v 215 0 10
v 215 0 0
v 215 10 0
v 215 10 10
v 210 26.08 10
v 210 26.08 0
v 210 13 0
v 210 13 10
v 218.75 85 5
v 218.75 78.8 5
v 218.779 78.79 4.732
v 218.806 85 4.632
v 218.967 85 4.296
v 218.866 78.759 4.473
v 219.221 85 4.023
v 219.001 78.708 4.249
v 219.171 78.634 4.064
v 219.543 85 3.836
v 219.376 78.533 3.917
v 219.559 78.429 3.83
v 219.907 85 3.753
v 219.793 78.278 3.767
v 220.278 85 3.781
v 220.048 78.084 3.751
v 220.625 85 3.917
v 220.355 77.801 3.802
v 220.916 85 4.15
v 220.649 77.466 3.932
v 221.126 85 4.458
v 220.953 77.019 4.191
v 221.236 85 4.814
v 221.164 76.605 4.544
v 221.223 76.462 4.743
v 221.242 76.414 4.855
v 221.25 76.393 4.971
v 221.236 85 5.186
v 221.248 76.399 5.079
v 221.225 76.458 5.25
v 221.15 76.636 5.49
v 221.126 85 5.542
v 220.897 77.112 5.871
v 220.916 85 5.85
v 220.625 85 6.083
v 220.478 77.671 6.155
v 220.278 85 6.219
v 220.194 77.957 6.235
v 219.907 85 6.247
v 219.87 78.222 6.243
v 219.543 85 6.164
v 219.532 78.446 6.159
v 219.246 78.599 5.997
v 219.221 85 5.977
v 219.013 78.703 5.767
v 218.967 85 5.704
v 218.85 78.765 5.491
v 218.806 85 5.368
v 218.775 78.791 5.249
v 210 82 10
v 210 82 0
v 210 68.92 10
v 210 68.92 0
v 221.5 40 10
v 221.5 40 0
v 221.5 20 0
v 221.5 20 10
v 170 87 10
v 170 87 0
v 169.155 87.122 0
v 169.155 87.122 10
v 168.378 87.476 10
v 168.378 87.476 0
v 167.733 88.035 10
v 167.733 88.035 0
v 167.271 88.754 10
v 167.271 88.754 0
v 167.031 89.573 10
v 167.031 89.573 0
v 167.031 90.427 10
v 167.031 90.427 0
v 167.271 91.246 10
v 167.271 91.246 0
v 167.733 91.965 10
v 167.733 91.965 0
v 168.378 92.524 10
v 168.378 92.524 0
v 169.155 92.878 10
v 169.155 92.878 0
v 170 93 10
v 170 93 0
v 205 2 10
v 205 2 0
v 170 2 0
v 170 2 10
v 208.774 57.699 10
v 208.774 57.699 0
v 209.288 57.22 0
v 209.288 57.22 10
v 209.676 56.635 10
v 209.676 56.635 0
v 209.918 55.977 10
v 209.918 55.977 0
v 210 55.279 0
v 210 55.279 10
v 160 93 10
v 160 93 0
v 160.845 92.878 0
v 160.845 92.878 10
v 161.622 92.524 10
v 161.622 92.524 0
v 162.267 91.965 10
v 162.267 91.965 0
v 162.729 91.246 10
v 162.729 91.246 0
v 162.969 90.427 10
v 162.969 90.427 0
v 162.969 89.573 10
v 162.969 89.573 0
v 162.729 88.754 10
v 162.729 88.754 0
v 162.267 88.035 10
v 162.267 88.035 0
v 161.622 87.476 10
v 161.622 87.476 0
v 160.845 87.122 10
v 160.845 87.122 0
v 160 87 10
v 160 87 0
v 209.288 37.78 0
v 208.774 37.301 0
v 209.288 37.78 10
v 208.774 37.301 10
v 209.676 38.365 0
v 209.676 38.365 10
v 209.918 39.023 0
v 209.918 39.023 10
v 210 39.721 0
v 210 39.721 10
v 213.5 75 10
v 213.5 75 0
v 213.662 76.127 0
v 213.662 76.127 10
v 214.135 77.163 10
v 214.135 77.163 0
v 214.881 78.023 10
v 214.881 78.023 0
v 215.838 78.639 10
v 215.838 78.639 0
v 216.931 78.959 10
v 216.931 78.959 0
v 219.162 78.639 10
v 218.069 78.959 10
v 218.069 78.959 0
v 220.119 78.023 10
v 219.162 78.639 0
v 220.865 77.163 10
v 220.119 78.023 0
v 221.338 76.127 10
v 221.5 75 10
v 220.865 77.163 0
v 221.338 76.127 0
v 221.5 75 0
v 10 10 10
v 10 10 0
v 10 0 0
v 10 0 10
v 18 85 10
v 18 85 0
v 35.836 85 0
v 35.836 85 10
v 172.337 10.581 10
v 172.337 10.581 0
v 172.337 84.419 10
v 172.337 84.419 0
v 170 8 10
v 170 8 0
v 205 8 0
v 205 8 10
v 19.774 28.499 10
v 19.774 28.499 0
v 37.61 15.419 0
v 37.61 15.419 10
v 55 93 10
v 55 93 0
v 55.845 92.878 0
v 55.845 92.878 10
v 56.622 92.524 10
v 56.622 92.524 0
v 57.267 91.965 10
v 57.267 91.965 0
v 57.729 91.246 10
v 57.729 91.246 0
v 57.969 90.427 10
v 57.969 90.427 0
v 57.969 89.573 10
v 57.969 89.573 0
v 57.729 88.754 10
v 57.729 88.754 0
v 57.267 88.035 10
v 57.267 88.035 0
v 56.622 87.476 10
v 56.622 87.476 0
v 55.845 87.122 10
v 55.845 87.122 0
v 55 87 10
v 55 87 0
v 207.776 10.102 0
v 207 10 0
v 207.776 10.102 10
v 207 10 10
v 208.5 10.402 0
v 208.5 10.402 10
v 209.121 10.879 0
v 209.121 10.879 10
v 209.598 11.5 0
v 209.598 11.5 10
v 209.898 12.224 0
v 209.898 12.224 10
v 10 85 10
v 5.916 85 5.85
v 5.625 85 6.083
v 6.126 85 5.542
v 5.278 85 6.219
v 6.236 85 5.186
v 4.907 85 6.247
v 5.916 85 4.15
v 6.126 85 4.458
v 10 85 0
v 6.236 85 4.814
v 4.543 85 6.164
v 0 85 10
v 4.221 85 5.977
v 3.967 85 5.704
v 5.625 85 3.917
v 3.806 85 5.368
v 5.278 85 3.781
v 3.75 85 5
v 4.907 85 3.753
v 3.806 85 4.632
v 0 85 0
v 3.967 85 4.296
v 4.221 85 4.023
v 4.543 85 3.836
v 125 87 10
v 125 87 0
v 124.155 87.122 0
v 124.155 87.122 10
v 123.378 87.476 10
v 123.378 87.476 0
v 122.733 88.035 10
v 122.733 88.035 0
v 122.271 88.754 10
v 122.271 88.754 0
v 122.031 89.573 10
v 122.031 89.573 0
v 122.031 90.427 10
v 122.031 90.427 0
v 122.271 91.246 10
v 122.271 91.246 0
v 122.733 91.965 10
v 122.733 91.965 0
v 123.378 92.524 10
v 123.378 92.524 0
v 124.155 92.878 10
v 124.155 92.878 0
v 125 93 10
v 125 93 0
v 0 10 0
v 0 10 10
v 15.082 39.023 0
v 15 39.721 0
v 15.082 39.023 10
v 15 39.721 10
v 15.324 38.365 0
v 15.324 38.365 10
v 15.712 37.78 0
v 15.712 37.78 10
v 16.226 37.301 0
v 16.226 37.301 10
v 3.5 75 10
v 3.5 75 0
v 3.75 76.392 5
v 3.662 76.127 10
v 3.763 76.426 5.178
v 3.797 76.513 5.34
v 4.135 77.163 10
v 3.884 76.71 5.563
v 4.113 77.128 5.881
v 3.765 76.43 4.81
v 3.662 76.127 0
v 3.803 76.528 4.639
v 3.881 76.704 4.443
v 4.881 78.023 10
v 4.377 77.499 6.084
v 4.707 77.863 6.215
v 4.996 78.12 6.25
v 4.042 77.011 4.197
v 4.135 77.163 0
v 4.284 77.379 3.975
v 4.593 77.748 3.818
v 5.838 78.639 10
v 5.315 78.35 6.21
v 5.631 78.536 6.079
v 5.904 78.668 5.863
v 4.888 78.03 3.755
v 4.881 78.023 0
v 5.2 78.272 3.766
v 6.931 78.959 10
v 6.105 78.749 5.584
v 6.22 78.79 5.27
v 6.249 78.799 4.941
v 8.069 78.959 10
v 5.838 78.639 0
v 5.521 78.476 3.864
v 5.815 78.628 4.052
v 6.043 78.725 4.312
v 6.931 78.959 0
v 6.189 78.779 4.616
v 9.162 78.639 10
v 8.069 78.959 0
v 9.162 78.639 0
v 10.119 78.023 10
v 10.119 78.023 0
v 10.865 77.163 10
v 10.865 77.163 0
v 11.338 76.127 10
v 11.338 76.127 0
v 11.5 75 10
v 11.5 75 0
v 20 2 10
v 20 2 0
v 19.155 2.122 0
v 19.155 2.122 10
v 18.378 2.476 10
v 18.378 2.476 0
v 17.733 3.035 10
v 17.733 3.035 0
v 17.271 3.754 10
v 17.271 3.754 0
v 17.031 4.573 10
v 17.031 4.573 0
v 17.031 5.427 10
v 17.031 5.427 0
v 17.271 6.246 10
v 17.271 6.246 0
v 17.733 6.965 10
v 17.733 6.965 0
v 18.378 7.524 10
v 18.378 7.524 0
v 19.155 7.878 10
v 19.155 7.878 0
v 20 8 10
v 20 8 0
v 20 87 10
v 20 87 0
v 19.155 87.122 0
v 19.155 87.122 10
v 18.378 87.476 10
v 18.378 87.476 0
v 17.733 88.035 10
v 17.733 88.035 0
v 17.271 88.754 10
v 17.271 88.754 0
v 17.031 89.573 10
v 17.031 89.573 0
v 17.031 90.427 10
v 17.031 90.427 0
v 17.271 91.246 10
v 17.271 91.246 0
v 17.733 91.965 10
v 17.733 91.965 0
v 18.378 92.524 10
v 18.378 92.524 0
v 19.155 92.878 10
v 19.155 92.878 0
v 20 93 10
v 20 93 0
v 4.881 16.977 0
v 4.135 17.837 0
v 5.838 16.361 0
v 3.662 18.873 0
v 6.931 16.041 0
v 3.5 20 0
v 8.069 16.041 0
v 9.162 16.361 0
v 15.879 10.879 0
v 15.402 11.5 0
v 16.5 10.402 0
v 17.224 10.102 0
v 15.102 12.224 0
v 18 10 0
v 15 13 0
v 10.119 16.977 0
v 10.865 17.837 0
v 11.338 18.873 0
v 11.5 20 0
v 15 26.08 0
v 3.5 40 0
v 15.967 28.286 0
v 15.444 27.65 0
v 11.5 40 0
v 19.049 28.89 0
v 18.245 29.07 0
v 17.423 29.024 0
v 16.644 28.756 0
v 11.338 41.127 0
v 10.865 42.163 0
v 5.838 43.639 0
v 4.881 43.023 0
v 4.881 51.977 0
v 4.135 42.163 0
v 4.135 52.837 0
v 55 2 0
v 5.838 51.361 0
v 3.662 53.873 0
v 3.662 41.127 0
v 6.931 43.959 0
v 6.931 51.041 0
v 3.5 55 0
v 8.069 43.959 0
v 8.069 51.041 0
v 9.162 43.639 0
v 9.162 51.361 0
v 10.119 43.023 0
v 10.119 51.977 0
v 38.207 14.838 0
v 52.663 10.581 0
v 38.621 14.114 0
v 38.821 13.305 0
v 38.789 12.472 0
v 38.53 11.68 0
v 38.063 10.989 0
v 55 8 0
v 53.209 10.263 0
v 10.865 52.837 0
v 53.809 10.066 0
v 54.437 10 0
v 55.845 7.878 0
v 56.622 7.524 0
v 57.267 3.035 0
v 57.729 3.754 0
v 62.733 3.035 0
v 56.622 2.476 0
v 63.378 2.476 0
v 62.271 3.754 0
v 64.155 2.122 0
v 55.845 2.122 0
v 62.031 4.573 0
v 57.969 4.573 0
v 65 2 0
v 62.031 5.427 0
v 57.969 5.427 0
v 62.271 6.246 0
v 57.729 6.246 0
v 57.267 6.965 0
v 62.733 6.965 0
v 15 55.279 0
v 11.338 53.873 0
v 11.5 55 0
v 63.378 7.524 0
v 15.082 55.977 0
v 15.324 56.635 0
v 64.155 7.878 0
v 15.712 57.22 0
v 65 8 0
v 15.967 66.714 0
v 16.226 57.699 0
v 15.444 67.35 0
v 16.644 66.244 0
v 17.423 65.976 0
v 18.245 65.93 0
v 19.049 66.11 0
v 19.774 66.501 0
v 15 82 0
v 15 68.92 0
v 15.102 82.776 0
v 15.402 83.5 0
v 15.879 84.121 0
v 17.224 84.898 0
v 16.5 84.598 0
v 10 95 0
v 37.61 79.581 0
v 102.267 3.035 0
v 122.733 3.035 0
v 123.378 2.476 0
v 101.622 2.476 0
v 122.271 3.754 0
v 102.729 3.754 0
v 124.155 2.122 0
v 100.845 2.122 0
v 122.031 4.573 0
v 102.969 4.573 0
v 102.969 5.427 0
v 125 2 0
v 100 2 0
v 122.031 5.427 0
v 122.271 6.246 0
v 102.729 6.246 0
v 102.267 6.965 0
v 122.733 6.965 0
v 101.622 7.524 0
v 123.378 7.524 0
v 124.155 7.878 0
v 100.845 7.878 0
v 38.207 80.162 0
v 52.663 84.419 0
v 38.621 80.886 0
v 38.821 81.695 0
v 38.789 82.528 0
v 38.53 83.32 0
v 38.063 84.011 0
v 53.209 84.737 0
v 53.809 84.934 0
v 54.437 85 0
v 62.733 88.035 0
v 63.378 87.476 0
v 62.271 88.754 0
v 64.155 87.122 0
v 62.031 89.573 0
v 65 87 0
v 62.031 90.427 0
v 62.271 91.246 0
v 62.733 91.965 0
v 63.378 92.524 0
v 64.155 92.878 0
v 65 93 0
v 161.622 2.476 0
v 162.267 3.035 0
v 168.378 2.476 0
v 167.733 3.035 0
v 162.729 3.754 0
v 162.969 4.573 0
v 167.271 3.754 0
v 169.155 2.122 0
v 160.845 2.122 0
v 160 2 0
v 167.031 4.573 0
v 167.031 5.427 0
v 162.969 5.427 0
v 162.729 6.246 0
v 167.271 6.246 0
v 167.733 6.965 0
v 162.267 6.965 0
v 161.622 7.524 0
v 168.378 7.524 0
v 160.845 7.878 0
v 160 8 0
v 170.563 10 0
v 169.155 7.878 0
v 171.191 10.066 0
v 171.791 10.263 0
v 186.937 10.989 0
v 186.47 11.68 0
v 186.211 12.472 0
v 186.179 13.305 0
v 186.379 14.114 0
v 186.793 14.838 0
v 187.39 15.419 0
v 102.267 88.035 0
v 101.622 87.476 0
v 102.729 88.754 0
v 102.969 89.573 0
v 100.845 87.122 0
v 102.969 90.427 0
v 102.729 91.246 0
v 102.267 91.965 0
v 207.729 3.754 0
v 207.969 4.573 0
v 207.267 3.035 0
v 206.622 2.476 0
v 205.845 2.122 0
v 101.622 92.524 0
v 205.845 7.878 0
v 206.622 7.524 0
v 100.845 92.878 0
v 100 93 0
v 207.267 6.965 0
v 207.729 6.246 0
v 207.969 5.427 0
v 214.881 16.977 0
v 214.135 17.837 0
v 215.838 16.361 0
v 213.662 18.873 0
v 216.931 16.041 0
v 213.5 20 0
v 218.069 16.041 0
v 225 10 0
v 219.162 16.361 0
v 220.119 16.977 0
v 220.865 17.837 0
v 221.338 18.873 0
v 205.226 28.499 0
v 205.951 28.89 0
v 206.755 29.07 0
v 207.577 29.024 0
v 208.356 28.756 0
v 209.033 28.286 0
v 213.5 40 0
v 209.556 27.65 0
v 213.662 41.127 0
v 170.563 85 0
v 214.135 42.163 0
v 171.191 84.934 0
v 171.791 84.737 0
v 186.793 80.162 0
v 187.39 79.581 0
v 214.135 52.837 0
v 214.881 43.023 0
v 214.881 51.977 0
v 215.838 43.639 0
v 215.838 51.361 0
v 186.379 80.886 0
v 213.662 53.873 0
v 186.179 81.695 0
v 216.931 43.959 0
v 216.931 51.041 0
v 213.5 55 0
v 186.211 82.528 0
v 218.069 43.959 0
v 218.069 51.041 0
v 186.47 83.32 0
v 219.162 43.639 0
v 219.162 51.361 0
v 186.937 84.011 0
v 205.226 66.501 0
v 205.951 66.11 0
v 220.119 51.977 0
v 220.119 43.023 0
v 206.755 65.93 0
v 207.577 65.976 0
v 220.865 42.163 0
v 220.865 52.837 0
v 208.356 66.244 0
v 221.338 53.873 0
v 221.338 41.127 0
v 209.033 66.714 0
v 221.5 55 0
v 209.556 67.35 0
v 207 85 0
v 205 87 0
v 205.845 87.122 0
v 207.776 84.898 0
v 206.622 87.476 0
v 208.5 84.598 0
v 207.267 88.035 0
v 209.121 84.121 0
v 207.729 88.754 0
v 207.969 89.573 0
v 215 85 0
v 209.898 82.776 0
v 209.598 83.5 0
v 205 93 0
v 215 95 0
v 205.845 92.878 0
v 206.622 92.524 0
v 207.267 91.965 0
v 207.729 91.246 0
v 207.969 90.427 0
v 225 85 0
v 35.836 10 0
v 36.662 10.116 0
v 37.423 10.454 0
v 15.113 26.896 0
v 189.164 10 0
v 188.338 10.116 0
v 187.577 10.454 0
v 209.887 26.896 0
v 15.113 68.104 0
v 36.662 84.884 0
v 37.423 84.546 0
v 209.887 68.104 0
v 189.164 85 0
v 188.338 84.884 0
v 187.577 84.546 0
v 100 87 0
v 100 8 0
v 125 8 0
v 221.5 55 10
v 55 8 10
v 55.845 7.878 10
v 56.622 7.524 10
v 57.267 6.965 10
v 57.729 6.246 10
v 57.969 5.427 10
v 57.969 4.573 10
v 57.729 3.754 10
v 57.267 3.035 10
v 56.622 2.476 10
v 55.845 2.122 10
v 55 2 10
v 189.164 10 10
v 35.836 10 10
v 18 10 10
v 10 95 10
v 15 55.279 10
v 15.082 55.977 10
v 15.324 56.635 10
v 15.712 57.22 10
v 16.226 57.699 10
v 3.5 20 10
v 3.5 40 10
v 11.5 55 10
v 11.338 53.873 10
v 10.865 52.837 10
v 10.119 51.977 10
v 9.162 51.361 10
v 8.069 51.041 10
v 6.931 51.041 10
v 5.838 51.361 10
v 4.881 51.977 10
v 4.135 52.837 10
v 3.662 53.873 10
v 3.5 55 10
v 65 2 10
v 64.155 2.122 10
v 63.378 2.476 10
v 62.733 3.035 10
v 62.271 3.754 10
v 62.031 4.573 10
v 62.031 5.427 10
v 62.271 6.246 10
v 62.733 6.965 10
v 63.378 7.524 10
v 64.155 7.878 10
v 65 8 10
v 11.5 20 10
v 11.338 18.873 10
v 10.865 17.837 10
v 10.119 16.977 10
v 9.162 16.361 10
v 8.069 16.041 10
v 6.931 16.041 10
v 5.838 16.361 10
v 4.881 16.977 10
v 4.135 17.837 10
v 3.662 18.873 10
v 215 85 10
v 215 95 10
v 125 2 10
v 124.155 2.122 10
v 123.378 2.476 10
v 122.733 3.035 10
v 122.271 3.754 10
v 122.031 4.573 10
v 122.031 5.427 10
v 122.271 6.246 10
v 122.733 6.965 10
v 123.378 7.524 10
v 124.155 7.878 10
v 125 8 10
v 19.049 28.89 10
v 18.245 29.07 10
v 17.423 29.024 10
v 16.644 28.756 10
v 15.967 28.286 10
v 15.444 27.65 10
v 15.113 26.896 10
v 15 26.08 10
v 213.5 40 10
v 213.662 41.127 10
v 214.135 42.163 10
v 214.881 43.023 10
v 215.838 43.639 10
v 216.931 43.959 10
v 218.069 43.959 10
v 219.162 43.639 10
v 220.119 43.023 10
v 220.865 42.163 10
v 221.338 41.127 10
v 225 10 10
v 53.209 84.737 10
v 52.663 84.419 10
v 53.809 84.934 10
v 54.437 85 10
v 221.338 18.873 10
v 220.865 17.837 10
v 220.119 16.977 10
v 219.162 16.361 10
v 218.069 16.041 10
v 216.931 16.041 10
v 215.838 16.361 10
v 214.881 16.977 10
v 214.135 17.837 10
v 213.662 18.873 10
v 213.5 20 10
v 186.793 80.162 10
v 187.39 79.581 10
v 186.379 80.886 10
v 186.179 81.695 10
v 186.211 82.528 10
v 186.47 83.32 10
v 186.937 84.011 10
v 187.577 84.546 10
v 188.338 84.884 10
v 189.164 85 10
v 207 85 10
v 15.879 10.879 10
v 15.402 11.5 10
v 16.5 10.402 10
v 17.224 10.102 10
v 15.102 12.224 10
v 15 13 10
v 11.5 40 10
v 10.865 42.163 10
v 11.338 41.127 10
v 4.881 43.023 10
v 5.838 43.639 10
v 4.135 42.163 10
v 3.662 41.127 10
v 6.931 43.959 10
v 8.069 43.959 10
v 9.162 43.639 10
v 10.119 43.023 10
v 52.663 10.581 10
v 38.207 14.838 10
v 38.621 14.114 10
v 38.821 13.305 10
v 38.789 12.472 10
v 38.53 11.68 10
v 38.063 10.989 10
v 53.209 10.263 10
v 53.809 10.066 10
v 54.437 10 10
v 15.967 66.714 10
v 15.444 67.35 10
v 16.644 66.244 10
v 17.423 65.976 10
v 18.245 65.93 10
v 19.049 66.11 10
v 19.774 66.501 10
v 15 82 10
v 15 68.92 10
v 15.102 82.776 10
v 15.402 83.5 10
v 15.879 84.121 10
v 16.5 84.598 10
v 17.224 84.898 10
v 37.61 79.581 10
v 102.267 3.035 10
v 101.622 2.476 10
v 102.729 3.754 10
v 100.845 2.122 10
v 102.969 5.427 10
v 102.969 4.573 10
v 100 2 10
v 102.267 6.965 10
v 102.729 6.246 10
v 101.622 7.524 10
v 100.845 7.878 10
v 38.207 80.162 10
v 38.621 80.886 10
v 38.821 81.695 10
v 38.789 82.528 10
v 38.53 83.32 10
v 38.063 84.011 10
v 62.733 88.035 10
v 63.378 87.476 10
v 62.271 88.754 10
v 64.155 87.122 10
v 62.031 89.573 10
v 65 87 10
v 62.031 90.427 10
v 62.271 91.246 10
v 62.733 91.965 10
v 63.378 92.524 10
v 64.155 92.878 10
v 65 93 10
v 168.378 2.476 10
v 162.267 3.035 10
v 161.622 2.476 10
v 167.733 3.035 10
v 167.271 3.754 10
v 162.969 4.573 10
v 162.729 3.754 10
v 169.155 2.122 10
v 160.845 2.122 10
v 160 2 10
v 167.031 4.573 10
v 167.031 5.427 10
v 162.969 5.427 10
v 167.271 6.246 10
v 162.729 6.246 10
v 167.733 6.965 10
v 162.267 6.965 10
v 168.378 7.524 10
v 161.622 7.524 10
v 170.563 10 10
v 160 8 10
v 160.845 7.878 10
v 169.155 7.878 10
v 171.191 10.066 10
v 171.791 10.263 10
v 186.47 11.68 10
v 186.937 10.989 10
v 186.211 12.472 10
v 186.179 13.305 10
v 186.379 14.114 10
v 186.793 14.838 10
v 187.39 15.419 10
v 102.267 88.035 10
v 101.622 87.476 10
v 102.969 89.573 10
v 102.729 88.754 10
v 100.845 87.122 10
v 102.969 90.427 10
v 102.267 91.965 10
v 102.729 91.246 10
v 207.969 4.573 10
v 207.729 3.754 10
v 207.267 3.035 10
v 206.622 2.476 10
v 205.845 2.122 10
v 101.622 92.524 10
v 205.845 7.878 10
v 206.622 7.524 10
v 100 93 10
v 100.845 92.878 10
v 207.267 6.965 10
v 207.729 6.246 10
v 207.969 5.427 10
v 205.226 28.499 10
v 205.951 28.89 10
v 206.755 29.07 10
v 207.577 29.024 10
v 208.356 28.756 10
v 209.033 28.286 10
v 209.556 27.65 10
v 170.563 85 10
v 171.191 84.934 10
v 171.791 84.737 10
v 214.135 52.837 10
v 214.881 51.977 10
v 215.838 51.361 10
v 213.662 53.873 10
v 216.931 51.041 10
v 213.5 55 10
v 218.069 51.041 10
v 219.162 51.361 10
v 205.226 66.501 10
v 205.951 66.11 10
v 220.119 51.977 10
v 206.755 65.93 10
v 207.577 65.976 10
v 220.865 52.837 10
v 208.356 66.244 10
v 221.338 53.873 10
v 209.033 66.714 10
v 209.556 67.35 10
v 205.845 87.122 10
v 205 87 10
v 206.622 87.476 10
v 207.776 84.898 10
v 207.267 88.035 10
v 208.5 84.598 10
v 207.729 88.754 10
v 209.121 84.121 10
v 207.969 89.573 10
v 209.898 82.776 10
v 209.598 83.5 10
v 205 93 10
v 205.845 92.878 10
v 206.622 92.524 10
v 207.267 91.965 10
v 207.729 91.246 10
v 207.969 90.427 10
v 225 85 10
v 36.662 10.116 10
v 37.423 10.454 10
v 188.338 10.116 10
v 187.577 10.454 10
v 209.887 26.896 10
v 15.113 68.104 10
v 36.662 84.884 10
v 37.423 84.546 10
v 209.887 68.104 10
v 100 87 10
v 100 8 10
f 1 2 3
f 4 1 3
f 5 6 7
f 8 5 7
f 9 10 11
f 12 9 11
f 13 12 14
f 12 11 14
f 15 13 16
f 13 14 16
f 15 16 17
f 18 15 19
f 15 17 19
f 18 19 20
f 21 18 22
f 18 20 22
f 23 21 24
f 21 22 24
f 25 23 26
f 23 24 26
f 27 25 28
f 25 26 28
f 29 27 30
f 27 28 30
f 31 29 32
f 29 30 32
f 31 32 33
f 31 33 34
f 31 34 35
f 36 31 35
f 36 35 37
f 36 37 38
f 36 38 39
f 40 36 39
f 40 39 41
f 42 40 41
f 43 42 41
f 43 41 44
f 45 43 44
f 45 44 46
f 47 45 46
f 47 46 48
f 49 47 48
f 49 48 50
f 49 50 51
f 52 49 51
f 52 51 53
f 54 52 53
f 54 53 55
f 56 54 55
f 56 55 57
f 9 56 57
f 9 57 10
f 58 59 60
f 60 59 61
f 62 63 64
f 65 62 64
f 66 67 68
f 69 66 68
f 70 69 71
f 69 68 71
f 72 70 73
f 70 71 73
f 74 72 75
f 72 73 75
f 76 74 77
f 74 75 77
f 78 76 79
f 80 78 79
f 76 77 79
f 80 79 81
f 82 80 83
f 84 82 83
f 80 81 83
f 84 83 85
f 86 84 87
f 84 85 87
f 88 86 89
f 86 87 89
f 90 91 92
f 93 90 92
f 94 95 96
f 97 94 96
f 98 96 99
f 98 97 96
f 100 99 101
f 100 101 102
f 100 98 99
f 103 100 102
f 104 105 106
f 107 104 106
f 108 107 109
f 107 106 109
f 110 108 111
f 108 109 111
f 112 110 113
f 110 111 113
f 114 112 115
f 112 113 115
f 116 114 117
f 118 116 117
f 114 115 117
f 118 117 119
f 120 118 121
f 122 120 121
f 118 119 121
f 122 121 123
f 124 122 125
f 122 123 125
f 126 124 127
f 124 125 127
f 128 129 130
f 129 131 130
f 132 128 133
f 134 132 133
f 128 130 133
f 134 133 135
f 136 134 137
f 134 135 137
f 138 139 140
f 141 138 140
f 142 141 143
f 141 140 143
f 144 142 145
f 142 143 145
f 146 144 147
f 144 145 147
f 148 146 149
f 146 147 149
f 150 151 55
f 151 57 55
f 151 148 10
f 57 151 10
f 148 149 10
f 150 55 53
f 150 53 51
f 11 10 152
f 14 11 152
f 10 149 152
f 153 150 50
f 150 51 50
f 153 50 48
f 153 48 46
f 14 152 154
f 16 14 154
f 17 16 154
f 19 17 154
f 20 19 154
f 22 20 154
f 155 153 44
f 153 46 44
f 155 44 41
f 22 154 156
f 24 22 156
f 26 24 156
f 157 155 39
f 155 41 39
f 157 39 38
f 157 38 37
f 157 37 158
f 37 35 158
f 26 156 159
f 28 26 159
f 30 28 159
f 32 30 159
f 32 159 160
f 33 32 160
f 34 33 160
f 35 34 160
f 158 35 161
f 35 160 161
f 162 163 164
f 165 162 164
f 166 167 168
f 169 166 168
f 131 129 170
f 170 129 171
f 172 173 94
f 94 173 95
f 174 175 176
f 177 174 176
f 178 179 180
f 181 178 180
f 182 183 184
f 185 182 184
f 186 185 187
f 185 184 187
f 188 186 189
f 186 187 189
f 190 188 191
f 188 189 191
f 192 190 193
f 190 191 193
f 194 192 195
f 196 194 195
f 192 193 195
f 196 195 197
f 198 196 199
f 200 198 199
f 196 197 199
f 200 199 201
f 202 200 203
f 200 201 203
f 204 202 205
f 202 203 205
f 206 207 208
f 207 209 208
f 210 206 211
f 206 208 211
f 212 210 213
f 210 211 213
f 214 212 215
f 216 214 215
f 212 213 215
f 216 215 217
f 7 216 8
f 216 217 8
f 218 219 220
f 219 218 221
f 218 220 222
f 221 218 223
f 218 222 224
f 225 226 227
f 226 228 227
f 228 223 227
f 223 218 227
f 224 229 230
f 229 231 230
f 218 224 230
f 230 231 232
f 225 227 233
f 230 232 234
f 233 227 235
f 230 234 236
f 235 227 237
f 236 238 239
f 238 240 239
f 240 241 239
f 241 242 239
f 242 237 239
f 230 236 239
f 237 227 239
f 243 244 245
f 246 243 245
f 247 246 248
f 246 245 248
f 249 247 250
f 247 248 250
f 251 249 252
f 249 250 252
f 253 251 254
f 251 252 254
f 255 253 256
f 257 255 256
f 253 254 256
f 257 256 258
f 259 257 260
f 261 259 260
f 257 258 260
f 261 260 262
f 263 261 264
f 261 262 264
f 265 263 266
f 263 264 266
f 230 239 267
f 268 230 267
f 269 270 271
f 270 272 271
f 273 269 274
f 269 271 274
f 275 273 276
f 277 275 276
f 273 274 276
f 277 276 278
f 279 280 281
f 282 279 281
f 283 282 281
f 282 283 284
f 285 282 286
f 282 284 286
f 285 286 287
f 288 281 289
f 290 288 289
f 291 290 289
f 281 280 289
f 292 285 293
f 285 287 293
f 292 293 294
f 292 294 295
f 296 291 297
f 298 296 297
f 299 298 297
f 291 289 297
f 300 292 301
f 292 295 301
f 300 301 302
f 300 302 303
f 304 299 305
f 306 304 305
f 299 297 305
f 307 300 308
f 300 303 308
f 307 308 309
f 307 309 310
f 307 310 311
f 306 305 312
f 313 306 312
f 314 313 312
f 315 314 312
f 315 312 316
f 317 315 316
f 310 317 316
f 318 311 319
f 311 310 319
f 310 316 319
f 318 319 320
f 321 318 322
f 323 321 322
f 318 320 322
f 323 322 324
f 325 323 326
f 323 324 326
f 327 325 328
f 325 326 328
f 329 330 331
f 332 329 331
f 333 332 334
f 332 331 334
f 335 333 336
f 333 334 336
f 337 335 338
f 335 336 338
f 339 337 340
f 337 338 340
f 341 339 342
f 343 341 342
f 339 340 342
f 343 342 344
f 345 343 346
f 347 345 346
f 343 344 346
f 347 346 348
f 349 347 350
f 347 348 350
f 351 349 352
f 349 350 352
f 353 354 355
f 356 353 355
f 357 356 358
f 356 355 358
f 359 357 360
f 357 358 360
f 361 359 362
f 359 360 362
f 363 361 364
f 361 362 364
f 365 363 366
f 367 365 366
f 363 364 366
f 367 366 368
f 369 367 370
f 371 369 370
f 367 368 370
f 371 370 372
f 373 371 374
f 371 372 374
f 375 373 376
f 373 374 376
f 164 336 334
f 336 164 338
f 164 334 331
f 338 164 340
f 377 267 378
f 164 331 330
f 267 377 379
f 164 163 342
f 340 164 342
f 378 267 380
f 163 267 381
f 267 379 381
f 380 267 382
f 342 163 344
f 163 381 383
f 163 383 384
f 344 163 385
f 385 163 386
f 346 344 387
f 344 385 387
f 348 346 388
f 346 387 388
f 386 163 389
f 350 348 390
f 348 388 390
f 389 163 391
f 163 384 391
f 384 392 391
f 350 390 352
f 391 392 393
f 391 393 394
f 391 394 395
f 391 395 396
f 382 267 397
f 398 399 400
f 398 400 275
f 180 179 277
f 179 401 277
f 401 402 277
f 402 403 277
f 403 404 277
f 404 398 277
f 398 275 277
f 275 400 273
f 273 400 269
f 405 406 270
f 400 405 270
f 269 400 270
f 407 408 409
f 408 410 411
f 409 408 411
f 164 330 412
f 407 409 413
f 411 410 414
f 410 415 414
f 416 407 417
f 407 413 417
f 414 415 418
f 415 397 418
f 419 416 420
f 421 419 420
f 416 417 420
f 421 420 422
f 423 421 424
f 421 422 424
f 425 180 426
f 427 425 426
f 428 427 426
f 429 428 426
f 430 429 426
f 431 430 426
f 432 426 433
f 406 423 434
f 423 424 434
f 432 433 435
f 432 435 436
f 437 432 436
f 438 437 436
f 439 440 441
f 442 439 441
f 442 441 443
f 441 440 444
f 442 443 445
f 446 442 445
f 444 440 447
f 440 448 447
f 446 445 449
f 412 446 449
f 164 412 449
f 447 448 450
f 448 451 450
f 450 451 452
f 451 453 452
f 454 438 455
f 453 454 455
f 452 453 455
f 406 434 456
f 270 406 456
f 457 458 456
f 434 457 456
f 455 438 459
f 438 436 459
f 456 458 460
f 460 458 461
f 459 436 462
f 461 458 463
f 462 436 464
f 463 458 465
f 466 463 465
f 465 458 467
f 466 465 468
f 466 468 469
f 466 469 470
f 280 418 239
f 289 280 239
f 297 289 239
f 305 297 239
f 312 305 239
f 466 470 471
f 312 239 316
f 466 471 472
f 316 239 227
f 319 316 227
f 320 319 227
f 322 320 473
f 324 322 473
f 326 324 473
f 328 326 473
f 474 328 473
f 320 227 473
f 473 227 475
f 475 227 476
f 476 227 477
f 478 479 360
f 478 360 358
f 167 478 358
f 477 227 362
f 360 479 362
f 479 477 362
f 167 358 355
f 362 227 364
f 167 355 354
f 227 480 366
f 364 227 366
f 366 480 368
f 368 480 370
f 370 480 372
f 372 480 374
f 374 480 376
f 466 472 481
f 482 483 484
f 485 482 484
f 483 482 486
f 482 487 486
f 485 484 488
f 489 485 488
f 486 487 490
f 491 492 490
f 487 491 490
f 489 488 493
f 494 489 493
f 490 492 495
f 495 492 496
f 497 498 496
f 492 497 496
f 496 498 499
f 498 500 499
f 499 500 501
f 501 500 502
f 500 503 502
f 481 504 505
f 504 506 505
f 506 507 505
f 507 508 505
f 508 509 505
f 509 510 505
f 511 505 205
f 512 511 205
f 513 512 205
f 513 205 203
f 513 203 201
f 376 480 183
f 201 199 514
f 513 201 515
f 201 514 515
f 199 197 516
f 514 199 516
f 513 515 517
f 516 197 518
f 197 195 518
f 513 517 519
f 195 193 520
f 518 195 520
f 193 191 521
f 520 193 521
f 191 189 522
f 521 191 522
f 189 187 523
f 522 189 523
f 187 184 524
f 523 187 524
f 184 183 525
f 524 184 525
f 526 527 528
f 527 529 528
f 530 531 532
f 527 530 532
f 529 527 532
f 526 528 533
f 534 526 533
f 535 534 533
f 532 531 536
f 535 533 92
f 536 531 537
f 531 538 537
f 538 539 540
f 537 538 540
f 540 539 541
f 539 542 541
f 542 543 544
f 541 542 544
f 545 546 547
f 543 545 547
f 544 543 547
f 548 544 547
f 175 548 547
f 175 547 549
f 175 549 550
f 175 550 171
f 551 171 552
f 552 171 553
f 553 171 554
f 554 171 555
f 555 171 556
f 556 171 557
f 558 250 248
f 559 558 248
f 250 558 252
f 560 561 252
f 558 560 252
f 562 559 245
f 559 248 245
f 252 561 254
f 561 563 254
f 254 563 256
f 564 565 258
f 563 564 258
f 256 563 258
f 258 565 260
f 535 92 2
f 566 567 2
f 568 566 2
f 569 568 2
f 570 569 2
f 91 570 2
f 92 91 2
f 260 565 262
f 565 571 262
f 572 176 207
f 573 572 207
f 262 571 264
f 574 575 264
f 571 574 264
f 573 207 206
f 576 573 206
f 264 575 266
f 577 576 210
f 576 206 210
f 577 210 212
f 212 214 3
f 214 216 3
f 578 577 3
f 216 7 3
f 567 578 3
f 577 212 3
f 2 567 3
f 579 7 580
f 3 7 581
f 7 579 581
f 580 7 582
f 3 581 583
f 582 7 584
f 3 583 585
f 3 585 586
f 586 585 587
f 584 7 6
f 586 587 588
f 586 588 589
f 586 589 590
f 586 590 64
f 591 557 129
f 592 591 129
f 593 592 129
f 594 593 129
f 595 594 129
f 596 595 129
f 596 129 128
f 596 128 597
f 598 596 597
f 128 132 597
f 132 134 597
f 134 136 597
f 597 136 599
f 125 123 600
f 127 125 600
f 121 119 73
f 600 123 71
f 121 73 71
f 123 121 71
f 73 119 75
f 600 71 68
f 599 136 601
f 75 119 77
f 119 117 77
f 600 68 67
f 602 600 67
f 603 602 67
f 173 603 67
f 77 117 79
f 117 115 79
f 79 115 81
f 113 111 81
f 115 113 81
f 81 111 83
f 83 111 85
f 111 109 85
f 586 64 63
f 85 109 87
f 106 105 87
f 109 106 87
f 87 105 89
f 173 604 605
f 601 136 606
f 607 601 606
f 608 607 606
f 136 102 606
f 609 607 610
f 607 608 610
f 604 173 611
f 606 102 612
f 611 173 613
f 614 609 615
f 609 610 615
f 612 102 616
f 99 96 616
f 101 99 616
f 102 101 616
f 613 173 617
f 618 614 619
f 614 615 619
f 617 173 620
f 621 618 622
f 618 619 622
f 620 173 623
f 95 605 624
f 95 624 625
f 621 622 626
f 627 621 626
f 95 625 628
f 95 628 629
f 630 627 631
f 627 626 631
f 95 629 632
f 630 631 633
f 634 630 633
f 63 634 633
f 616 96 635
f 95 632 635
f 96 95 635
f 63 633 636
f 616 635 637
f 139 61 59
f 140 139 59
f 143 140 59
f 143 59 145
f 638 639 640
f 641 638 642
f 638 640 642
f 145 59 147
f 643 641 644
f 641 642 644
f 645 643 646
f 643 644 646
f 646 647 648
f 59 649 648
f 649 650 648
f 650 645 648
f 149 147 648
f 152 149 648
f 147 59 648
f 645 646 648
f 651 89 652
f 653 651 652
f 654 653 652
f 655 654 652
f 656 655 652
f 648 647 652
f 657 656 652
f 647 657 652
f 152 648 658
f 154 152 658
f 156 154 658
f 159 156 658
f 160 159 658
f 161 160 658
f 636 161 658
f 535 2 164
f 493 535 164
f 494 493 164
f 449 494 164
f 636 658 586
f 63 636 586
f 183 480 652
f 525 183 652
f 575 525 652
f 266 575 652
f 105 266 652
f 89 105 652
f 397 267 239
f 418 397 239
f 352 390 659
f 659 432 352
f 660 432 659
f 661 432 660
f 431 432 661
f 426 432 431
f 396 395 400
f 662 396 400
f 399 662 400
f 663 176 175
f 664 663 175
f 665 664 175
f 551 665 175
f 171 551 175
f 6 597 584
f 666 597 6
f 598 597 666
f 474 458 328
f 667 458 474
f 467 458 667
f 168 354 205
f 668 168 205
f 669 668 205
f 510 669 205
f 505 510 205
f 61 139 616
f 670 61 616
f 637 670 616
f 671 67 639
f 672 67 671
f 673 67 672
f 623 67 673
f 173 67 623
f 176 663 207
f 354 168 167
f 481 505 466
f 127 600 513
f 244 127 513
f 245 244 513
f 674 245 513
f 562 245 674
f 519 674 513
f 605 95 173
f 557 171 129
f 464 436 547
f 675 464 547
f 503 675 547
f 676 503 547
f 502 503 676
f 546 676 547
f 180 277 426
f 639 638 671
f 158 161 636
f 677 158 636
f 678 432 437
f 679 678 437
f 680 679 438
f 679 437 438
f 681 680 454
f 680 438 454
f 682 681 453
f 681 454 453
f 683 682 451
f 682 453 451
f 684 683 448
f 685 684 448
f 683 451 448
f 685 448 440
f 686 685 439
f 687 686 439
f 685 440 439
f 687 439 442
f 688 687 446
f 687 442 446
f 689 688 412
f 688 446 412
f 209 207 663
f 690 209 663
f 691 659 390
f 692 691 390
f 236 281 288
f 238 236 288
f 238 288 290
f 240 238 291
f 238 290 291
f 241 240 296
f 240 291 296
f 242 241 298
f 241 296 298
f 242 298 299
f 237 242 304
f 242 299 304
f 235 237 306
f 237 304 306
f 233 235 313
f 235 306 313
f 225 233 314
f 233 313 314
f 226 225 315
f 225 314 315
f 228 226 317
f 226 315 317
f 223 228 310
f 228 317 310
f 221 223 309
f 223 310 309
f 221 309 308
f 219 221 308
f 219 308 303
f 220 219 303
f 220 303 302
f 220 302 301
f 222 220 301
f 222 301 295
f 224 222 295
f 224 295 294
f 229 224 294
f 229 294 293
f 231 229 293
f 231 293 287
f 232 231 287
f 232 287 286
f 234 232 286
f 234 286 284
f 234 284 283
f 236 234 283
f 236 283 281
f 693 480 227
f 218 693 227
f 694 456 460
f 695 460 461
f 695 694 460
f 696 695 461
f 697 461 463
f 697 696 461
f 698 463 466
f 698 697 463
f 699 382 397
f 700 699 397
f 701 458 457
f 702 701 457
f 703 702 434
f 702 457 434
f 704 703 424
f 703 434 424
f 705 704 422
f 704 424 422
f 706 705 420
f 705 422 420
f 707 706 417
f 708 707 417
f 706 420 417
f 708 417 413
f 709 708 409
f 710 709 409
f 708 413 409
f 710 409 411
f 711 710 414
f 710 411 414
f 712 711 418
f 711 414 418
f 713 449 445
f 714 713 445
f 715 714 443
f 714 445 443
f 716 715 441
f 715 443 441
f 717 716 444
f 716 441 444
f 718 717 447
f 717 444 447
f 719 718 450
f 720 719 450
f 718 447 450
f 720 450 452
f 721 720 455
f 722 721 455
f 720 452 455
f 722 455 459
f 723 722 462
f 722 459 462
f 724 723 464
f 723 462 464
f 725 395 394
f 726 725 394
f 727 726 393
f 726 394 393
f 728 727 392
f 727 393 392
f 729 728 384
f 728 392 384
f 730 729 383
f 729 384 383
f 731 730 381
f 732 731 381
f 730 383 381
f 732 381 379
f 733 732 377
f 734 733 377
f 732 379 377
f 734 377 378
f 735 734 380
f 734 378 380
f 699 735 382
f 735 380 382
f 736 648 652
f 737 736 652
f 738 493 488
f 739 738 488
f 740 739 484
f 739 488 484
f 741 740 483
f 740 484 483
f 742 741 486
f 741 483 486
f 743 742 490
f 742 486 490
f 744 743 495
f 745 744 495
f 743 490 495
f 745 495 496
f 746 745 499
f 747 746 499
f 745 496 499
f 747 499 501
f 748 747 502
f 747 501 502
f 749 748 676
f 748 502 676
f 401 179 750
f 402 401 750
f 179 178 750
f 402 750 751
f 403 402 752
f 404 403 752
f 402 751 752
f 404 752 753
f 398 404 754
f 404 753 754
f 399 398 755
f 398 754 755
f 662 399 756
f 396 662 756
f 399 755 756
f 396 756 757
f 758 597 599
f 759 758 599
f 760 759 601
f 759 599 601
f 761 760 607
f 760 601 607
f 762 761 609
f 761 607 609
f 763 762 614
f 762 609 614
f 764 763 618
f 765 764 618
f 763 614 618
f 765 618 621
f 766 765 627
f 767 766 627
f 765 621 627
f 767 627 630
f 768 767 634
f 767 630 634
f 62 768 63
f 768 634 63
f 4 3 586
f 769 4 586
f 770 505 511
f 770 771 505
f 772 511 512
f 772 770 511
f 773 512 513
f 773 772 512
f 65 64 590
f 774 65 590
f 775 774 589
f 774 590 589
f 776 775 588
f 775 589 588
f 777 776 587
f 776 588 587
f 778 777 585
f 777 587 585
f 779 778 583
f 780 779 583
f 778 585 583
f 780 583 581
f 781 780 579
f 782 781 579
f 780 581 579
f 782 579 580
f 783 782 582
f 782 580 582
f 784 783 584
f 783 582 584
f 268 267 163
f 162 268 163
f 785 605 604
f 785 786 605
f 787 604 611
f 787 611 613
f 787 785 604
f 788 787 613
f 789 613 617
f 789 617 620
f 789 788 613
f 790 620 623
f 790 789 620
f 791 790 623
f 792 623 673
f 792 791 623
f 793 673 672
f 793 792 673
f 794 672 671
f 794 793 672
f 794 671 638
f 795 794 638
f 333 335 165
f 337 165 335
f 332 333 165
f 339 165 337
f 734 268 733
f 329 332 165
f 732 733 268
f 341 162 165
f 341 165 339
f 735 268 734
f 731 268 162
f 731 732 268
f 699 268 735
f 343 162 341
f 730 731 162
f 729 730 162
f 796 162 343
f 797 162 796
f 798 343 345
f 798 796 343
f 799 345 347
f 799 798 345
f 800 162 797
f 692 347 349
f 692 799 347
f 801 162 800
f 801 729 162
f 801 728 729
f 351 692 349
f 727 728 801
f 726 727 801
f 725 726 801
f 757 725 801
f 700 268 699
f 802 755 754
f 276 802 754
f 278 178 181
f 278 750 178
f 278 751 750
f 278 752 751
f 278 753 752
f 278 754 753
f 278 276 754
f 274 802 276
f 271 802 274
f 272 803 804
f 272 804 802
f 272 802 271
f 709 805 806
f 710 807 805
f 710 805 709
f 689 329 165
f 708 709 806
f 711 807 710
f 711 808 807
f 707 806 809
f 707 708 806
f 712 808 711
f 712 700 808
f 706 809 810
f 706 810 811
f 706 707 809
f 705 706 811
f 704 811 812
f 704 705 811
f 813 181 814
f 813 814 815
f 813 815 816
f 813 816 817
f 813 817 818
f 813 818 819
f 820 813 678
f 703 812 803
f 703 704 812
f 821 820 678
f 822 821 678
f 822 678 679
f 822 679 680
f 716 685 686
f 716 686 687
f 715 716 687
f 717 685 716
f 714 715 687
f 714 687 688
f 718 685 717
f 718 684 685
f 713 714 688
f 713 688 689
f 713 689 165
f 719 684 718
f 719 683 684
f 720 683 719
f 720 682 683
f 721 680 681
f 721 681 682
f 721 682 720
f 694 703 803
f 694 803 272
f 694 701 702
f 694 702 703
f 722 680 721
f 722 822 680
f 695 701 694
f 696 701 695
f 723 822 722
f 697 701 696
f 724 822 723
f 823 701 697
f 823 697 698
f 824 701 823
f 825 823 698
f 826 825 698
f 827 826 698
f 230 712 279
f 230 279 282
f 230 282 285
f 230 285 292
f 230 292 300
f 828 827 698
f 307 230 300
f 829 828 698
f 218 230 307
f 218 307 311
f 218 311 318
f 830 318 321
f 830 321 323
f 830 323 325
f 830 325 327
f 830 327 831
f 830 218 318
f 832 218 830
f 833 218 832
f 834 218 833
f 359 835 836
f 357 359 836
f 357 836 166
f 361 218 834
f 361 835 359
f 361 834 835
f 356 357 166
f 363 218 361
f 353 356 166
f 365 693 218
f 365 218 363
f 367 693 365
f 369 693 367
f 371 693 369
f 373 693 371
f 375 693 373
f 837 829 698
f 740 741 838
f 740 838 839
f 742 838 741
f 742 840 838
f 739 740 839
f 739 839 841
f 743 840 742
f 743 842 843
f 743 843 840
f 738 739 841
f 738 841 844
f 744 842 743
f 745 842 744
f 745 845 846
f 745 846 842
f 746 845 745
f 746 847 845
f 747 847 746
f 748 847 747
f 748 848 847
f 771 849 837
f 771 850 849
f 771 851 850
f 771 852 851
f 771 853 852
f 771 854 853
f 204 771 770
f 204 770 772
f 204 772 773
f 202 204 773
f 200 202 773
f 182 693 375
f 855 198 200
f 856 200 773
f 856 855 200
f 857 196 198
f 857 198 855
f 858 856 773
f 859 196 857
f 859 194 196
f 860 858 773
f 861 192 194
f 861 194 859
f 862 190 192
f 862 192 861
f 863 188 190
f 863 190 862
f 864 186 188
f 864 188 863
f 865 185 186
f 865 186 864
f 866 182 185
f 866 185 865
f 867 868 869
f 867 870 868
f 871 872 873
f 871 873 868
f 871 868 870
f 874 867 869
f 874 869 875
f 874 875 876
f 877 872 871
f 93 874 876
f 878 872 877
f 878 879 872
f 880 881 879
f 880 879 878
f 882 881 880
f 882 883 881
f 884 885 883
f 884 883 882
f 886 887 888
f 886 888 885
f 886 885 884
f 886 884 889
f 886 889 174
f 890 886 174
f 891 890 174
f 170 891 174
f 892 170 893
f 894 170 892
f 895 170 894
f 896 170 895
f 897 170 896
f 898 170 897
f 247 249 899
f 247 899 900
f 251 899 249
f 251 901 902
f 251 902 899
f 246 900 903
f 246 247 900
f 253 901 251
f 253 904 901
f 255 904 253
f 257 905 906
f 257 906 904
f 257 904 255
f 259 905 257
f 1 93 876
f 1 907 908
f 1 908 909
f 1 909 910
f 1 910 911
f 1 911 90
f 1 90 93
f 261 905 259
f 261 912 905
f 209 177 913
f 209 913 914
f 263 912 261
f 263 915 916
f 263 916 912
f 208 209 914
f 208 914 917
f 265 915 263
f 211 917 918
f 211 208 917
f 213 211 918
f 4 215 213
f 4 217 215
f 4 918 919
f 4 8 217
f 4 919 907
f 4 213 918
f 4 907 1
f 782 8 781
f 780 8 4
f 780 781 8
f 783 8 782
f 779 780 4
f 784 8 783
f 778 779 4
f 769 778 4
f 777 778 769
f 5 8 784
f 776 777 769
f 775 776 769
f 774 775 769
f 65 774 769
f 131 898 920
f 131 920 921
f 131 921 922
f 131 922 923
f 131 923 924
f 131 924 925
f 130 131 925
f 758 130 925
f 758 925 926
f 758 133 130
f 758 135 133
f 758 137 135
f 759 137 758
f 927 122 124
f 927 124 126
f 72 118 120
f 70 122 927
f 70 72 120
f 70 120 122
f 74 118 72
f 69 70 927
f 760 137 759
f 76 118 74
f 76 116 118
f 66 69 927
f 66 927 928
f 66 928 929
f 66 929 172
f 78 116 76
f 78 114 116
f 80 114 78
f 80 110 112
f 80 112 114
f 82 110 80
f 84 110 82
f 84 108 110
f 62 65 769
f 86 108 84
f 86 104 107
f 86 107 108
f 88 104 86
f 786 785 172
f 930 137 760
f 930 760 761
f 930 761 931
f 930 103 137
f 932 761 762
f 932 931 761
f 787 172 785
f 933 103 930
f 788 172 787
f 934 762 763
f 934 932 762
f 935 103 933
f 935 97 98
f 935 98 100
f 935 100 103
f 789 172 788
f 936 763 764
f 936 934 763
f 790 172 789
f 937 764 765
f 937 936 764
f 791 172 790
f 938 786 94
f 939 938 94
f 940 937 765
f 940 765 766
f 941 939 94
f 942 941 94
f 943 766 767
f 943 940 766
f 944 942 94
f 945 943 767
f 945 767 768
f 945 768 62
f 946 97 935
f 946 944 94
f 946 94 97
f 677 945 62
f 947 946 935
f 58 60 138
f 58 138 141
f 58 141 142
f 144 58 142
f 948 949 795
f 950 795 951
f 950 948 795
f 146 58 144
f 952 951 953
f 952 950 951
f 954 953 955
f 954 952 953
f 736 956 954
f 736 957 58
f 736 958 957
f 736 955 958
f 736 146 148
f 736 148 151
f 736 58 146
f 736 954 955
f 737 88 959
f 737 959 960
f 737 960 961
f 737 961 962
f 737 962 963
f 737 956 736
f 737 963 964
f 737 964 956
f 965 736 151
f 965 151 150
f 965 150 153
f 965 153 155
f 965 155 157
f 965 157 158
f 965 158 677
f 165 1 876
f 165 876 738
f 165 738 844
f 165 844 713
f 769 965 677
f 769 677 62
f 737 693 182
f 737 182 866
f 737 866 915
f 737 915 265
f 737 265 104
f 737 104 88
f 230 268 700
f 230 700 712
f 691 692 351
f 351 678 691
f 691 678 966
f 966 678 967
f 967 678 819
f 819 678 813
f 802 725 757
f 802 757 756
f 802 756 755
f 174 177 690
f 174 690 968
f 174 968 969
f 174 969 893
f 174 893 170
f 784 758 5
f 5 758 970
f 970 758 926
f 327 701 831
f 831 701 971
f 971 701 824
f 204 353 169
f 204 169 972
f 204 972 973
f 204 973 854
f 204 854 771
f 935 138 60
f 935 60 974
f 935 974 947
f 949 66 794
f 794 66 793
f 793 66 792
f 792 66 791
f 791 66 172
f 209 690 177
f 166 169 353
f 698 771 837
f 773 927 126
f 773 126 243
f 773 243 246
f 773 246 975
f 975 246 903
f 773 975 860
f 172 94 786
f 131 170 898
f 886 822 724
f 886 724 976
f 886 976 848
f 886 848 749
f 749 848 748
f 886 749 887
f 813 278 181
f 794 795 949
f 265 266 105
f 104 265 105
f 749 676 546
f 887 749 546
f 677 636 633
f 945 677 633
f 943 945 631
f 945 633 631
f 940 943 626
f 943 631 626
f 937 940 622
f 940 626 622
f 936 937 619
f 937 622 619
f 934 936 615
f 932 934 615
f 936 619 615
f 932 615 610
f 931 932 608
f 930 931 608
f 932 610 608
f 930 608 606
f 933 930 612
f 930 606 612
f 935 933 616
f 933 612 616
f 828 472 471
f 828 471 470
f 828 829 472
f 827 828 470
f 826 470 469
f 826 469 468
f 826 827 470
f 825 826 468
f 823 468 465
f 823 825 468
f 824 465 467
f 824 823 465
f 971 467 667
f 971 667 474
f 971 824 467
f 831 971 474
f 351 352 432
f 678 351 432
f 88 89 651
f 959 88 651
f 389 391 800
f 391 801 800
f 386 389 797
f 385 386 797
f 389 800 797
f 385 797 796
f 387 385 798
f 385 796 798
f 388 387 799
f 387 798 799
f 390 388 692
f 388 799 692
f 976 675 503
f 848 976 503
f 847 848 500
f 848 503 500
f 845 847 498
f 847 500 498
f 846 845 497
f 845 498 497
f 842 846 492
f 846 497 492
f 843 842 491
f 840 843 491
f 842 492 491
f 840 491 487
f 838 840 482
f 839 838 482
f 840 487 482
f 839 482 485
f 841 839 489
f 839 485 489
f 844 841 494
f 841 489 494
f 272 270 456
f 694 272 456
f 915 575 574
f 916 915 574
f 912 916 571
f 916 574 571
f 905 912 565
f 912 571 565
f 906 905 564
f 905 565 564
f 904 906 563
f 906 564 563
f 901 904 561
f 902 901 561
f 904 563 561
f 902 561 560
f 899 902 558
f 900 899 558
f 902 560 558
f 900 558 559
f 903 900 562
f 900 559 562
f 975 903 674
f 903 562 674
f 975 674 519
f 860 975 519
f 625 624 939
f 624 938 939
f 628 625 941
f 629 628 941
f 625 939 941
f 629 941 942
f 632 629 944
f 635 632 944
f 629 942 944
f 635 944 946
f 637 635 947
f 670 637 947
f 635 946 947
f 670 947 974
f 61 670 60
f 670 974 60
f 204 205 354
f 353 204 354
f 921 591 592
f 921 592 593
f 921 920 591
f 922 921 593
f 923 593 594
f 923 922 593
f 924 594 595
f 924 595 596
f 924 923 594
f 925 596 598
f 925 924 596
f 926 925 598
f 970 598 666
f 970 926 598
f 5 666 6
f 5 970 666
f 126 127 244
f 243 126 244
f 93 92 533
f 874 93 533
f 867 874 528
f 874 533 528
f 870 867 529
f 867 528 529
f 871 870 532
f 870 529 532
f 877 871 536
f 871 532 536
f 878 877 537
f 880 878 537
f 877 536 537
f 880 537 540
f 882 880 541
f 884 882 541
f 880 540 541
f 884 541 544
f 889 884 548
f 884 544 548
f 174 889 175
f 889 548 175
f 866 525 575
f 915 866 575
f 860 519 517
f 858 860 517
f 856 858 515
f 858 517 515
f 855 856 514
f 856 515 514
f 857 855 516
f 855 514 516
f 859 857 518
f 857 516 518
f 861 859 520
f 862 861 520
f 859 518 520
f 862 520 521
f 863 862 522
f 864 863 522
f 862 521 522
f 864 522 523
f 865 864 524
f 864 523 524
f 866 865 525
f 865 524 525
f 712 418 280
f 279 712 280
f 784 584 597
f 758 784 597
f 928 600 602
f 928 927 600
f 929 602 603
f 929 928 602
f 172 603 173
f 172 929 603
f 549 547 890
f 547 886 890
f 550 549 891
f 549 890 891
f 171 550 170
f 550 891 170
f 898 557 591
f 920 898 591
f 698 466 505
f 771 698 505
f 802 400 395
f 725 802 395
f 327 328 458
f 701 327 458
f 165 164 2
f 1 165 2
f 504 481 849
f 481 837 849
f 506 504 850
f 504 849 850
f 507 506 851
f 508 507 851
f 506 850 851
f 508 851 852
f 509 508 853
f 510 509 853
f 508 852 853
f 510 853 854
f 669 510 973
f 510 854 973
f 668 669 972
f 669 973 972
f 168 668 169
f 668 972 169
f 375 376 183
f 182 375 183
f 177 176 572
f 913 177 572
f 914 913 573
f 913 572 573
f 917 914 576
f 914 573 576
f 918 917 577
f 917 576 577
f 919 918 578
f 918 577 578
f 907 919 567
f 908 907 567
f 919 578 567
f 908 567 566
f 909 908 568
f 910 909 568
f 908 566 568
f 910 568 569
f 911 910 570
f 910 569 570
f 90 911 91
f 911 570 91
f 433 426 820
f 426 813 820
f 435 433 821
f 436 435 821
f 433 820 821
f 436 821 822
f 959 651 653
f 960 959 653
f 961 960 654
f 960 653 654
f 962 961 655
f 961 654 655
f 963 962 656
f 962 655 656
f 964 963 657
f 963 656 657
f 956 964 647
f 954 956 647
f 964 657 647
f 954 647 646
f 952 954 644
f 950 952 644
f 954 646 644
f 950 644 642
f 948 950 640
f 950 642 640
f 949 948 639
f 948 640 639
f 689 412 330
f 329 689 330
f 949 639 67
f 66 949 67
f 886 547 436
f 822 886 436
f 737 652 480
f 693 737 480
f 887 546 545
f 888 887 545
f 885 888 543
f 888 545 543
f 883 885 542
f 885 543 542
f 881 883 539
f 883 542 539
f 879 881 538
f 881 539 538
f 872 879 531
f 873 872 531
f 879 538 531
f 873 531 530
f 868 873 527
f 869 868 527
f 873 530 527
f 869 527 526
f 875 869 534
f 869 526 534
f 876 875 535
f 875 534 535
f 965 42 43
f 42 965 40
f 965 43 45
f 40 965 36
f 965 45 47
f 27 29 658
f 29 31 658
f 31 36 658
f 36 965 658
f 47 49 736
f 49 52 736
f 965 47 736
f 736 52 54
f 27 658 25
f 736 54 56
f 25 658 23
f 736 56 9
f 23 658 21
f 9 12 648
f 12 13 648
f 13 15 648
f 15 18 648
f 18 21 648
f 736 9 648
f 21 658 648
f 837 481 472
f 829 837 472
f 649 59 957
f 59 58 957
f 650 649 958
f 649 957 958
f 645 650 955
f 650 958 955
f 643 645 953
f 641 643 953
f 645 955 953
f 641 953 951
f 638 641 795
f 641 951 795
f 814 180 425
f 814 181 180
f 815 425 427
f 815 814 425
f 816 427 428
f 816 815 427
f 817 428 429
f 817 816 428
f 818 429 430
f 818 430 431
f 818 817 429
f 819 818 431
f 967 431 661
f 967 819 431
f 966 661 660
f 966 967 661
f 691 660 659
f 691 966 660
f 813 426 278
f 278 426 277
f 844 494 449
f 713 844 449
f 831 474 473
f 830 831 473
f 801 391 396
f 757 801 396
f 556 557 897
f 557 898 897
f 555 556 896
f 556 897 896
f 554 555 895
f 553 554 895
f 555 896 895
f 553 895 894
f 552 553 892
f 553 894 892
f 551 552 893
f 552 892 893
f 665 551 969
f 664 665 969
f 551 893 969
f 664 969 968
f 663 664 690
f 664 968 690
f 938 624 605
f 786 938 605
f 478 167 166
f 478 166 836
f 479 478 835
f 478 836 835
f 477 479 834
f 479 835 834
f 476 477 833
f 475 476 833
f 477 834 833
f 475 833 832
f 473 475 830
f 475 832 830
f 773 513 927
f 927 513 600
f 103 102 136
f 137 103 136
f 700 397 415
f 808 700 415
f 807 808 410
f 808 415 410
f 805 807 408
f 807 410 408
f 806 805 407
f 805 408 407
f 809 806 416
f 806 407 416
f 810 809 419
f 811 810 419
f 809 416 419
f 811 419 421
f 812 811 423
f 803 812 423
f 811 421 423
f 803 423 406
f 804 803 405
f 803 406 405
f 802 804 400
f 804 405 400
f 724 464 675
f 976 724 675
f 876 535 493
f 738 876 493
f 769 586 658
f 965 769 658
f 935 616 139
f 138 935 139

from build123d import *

# Parameters (mm, degrees)
BOSS_EXTRUDE1_DEPTH   = 10
FILLET1_R             = 3
M3_TAPPED_HOLE2_D     = 2.5
M3_TAPPED_HOLE2_DEPTH = 15
M3_TAPPED_HOLE2_TIP   = 0.751075774


with BuildPart() as part:
    # Sketch1 → Boss-Extrude1 (new body)
    with BuildSketch(Plane.XY):
        Polygon((10, 10), (10, 0), (215, 0), (215, 10), (225, 10), (225, 85), (215, 85), (215, 95), (10, 95), (10, 85), (0, 85), (0, 10), align=None)
        with BuildLine():
            Line((20, 8), (55, 8))
            ThreePointArc((55, 8), (58, 5), (55, 2))
            Line((55, 2), (20, 2))
            ThreePointArc((20, 2), (17, 5), (20, 8))
        make_face(mode=Mode.SUBTRACT)
        with BuildLine():
            Line((65, 8), (100, 8))
            ThreePointArc((100, 8), (103, 5), (100, 2))
            Line((100, 2), (65, 2))
            ThreePointArc((65, 2), (62, 5), (65, 8))
        make_face(mode=Mode.SUBTRACT)
        with BuildLine():
            Line((3.5, 20), (3.5, 40))
            ThreePointArc((3.5, 40), (7.5, 44), (11.5, 40))
            Line((11.5, 40), (11.5, 20))
            ThreePointArc((11.5, 20), (7.5, 16), (3.5, 20))
        make_face(mode=Mode.SUBTRACT)
        with BuildLine():
            ThreePointArc((160, 8), (163, 5), (160, 2))
            Line((160, 2), (125, 2))
            ThreePointArc((125, 2), (122, 5), (125, 8))
            Line((125, 8), (160, 8))
        make_face(mode=Mode.SUBTRACT)
        with BuildLine():
            ThreePointArc((205, 8), (208, 5), (205, 2))
            Line((205, 2), (170, 2))
            ThreePointArc((170, 2), (167, 5), (170, 8))
            Line((170, 8), (205, 8))
        make_face(mode=Mode.SUBTRACT)
        with BuildLine():
            Line((213.5, 20), (213.5, 40))
            ThreePointArc((213.5, 40), (217.5, 44), (221.5, 40))
            Line((221.5, 40), (221.5, 20))
            ThreePointArc((221.5, 20), (217.5, 16), (213.5, 20))
        make_face(mode=Mode.SUBTRACT)
        with BuildLine():
            Line((3.5, 55), (3.5, 75))
            ThreePointArc((3.5, 75), (7.5, 79), (11.5, 75))
            Line((11.5, 75), (11.5, 55))
            ThreePointArc((11.5, 55), (7.5, 51), (3.5, 55))
        make_face(mode=Mode.SUBTRACT)
        with BuildLine():
            Line((20, 93), (55, 93))
            ThreePointArc((55, 93), (58, 90), (55, 87))
            Line((55, 87), (20, 87))
            ThreePointArc((20, 87), (17, 90), (20, 93))
        make_face(mode=Mode.SUBTRACT)
        with BuildLine():
            Line((65, 93), (100, 93))
            ThreePointArc((100, 93), (103, 90), (100, 87))
            Line((100, 87), (65, 87))
            ThreePointArc((65, 87), (62, 90), (65, 93))
        make_face(mode=Mode.SUBTRACT)
        Polygon((15, 63), (15, 85), (45, 85), align=None, mode=Mode.SUBTRACT)
        Polygon((15, 56.799641587), (53.455034199, 85), (171.544965801, 85), (210, 56.799641587), (210, 38.200358413), (171.544965801, 10), (53.455034199, 10), (15, 38.200358413), align=None, mode=Mode.SUBTRACT)
        Polygon((210, 32), (210, 10), (180, 10), align=None, mode=Mode.SUBTRACT)
        Polygon((180, 85), (210, 85), (210, 63), align=None, mode=Mode.SUBTRACT)
        Polygon((45, 10), (15, 10), (15, 32), align=None, mode=Mode.SUBTRACT)
        with BuildLine():
            Line((213.5, 55), (213.5, 75))
            ThreePointArc((213.5, 75), (217.5, 79), (221.5, 75))
            Line((221.5, 75), (221.5, 55))
            ThreePointArc((221.5, 55), (217.5, 51), (213.5, 55))
        make_face(mode=Mode.SUBTRACT)
        with BuildLine():
            Line((125, 93), (160, 93))
            ThreePointArc((160, 93), (163, 90), (160, 87))
            Line((160, 87), (125, 87))
            ThreePointArc((125, 87), (122, 90), (125, 93))
        make_face(mode=Mode.SUBTRACT)
        with BuildLine():
            Line((170, 93), (205, 93))
            ThreePointArc((205, 93), (208, 90), (205, 87))
            Line((205, 87), (170, 87))
            ThreePointArc((170, 87), (167, 90), (170, 93))
        make_face(mode=Mode.SUBTRACT)
    extrude(amount=BOSS_EXTRUDE1_DEPTH)

    # Fillet1
    fillet1_edges = [part.edges().sort_by_distance(p)[0] for p in [
        (15, 32, 5),
        (15, 10, 5),
        (45, 10, 5),
        (180, 10, 5),
        (210, 10, 5),
        (210, 32, 5),
        (210, 63, 5),
        (210, 85, 5),
        (180, 85, 5),
        (15, 85, 5),
        (15, 63, 5),
        (45, 85, 5),
        (53.455034199, 85, 5),
        (15, 56.799641587, 5),
        (15, 38.200358413, 5),
        (53.455034199, 10, 5),
        (171.544965801, 10, 5),
        (210, 38.200358413, 5),
        (210, 56.799641587, 5),
        (171.544965801, 85, 5),
    ]]
    fillet(fillet1_edges, radius=FILLET1_R)

    # M3 Tapped Hole2
    with Locations(Plane(origin=(0, 85, 0), x_dir=(1, 0, 0), z_dir=(0, 1, 0))):
        with Locations((220, -5), (5, -5)):
            Hole(M3_TAPPED_HOLE2_D / 2, depth=M3_TAPPED_HOLE2_DEPTH)
            with Locations((0, 0, -(M3_TAPPED_HOLE2_DEPTH + M3_TAPPED_HOLE2_TIP / 2))):  # 118° drill point
                Cone(0, M3_TAPPED_HOLE2_D / 2, M3_TAPPED_HOLE2_TIP, mode=Mode.SUBTRACT)


solid = part.part
